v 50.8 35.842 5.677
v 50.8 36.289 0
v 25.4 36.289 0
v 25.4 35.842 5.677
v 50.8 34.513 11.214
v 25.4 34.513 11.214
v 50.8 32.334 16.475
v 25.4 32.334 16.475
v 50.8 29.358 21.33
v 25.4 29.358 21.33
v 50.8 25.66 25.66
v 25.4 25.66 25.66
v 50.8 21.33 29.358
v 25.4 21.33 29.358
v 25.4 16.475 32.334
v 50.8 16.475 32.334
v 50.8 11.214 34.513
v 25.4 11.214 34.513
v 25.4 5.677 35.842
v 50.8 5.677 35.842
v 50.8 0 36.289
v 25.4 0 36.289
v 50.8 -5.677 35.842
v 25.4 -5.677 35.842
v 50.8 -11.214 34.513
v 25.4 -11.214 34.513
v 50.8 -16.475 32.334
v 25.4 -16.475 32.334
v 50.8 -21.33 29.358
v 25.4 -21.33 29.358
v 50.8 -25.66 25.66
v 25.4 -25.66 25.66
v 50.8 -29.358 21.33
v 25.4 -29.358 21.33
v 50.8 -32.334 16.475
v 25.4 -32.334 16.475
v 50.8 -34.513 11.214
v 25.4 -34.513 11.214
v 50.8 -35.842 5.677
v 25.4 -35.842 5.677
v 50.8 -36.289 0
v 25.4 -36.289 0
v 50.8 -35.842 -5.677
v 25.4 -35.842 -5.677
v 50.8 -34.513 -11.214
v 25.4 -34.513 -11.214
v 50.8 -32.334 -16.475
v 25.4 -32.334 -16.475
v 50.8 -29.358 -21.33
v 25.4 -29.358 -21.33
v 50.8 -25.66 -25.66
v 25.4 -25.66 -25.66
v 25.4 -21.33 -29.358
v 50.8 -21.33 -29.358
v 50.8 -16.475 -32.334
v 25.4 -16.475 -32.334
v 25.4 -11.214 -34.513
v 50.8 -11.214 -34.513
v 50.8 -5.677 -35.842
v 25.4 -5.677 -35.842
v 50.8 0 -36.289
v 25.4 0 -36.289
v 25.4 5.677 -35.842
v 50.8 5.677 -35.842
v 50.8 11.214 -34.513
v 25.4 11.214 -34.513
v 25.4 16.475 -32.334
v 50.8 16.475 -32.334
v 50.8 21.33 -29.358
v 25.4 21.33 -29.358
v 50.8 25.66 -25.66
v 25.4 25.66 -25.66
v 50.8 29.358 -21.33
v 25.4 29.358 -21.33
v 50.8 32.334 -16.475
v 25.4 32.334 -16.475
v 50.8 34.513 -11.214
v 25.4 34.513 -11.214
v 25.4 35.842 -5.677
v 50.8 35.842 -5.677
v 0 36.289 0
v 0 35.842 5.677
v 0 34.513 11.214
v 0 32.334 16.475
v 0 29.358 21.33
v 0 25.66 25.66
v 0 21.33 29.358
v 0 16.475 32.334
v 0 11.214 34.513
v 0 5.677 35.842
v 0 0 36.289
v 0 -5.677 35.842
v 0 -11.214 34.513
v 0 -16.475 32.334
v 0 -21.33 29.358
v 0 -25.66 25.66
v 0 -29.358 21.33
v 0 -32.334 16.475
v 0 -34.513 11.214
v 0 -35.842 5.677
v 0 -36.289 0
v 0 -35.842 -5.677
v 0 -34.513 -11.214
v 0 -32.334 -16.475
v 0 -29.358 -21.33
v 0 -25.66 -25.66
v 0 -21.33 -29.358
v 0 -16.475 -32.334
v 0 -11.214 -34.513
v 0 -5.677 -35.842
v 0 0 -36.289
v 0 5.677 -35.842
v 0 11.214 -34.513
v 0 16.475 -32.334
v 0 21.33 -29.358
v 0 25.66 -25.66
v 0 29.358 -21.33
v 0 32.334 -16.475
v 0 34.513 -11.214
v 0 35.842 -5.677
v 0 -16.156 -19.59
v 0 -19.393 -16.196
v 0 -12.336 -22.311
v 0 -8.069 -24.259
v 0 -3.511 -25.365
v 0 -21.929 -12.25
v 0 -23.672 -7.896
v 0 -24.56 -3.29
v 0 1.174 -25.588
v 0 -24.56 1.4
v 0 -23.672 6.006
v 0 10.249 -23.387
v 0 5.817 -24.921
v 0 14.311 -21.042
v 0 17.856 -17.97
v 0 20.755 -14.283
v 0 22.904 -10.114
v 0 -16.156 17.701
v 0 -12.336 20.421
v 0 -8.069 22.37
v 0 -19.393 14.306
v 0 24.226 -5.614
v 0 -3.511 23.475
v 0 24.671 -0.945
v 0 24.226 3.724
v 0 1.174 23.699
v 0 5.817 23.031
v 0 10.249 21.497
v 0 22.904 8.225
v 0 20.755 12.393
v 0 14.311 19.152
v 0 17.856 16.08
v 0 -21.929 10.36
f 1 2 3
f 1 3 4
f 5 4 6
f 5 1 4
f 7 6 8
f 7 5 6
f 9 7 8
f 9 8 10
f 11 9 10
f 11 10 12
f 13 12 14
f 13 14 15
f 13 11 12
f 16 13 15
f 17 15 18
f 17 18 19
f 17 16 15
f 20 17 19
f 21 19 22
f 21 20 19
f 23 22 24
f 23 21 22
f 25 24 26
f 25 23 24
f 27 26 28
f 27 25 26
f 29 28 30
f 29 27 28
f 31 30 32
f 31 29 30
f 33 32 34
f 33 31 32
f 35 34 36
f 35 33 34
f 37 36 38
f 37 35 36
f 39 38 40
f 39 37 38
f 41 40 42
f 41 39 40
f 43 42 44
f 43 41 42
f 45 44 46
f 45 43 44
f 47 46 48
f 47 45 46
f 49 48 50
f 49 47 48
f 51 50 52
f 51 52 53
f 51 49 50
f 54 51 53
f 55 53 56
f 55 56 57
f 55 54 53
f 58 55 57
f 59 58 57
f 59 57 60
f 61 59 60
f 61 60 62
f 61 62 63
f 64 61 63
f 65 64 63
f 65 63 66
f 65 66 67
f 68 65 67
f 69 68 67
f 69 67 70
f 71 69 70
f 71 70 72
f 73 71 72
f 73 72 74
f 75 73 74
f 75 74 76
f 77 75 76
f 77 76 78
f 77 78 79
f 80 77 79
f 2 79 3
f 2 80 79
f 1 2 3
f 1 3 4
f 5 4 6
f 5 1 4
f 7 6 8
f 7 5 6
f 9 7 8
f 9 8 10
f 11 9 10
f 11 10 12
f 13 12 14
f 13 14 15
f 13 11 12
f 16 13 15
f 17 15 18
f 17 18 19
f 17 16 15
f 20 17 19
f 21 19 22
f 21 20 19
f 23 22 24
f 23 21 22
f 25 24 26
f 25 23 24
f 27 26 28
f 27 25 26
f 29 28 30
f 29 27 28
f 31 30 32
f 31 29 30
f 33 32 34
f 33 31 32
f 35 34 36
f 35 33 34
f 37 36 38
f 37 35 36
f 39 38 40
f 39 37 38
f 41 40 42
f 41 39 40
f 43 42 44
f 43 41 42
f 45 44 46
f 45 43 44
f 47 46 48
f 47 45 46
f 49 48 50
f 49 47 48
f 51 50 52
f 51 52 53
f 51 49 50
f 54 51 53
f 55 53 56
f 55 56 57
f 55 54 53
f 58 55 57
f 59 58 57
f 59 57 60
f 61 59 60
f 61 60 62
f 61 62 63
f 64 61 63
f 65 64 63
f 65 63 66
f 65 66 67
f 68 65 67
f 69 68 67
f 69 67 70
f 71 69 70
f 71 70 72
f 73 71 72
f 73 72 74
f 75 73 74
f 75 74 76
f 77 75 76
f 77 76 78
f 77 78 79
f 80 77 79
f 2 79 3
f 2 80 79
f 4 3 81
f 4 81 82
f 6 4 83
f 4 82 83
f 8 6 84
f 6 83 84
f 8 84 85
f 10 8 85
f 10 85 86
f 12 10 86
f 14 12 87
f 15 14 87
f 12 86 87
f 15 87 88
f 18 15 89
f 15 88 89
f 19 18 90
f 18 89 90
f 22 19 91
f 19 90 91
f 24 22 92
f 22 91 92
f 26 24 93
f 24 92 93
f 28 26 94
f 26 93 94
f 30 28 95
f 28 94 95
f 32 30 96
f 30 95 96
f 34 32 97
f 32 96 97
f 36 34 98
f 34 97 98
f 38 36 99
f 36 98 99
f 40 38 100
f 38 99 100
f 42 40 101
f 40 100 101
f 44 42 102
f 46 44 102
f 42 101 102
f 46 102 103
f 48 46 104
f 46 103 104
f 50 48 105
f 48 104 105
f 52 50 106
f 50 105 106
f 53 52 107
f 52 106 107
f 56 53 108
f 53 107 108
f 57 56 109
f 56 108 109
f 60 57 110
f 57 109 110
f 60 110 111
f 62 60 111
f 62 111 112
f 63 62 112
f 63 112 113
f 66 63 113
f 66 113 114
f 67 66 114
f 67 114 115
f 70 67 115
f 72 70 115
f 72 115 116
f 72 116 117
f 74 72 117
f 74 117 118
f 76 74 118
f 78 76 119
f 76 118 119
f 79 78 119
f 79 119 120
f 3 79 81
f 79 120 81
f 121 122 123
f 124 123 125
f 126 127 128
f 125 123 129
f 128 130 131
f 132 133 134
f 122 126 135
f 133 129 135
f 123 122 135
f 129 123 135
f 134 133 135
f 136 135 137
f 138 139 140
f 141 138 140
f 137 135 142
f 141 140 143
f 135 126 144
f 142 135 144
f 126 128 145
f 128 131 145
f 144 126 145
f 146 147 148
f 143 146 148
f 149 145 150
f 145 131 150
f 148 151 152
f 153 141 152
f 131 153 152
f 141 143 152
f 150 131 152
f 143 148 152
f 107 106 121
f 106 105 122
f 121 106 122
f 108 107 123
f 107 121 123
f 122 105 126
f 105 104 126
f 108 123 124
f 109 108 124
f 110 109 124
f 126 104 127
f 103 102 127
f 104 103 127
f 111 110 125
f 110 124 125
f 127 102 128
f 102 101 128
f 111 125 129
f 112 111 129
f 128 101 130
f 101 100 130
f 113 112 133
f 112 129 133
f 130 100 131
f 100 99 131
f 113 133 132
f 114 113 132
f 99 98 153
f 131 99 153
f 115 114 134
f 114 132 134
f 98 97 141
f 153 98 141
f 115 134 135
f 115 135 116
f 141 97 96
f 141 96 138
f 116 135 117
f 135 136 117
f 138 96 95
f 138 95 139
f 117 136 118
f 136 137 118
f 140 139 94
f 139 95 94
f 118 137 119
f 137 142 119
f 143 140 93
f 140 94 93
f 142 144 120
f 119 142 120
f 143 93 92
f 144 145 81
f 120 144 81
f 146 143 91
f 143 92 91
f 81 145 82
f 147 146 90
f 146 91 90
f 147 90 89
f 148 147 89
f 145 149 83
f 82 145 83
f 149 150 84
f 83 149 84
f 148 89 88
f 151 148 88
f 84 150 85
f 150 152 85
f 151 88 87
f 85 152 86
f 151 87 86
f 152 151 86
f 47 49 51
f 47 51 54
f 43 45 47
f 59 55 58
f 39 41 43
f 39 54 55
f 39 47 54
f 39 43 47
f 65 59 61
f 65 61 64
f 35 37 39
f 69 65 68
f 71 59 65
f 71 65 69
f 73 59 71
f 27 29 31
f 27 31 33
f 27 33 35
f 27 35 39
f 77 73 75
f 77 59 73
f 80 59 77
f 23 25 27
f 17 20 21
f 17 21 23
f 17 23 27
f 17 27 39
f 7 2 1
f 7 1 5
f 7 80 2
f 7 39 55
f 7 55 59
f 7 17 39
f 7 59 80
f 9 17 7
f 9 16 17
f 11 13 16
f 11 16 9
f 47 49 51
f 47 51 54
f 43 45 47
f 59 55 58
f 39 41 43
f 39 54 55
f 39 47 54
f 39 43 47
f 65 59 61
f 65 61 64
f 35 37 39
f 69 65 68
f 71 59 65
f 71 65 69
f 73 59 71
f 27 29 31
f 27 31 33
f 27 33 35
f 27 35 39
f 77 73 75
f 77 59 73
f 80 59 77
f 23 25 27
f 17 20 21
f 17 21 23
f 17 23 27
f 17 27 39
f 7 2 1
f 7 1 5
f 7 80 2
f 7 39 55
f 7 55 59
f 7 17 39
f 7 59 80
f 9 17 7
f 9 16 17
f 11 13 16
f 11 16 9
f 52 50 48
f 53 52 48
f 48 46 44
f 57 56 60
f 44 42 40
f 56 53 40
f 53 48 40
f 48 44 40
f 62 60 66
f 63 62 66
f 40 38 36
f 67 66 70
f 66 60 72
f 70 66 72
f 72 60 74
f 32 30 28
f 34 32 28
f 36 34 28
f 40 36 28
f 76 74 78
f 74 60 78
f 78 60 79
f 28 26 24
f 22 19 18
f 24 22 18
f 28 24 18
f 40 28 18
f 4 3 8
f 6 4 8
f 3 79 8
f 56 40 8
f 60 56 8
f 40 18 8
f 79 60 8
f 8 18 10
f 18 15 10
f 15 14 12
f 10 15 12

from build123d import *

# Parameters (mm, degrees)
F0_R      = 36.2887451917
F1_DEPTH  = 25.4
F3_DEPTH  = 25.4
F4_DEPTH  = 25.4
F5_DEPTH  = 25.4
F4_FACE_R = 36.2887451917
F2_R      = 24.6714612135
F6_DEPTH  = 25.4
F7_DEPTH  = 25.4
F8_DEPTH  = 25.4


with BuildPart() as f1:
    # F0 (on Right) → F1 (new body)
    with BuildSketch(Plane.YZ):
        Circle(F0_R)
    extrude(amount=F1_DEPTH)



with BuildPart() as f3:
    # F0 (on Right) → F3 (new body)
    with BuildSketch(Plane.YZ):
        Circle(F0_R)
    extrude(amount=F3_DEPTH)


with BuildPart() as f1_1:
    add(f1.part)
    # F4 (add): a face of the model
    f4_faces = [f3.part.faces().sort_by_distance(p)[0] for p in [
        (25.4, 0, 0),
    ]]

    add(f3.part)  # F4 merges F3
    extrude(f4_faces, amount=F4_DEPTH)

    # F5 (add): a face of the model
    f5_faces = [f1_1.faces().sort_by_distance(p)[0] for p in [
        (50.8, 0, 0),
    ]]
    extrude(f5_faces, amount=-F5_DEPTH)

    # F4_face (on face) + F2 (on face) → F6 (join)
    with BuildSketch(Plane.YZ.offset(50.8)):
        Circle(F4_FACE_R)
    with BuildSketch(Plane.YZ.offset(25.4)):
        with Locations((0, -0.9449110366)):
            Circle(F2_R)
    extrude(amount=-F6_DEPTH)

    # F7 (add): a face of the model
    f7_faces = [f1_1.faces().sort_by_distance(p)[0] for p in [
        (50.8, 0, 0),
    ]]
    extrude(f7_faces, amount=-F7_DEPTH)


with BuildPart() as f8:
    # F8 (new): a face of the model
    f8_faces = [f1_1.part.faces().sort_by_distance(p)[0] for p in [
        (50.8, 0, 0),
    ]]
    extrude(f8_faces, amount=-F8_DEPTH)


solid = Compound([f1_1.part, f8.part])
